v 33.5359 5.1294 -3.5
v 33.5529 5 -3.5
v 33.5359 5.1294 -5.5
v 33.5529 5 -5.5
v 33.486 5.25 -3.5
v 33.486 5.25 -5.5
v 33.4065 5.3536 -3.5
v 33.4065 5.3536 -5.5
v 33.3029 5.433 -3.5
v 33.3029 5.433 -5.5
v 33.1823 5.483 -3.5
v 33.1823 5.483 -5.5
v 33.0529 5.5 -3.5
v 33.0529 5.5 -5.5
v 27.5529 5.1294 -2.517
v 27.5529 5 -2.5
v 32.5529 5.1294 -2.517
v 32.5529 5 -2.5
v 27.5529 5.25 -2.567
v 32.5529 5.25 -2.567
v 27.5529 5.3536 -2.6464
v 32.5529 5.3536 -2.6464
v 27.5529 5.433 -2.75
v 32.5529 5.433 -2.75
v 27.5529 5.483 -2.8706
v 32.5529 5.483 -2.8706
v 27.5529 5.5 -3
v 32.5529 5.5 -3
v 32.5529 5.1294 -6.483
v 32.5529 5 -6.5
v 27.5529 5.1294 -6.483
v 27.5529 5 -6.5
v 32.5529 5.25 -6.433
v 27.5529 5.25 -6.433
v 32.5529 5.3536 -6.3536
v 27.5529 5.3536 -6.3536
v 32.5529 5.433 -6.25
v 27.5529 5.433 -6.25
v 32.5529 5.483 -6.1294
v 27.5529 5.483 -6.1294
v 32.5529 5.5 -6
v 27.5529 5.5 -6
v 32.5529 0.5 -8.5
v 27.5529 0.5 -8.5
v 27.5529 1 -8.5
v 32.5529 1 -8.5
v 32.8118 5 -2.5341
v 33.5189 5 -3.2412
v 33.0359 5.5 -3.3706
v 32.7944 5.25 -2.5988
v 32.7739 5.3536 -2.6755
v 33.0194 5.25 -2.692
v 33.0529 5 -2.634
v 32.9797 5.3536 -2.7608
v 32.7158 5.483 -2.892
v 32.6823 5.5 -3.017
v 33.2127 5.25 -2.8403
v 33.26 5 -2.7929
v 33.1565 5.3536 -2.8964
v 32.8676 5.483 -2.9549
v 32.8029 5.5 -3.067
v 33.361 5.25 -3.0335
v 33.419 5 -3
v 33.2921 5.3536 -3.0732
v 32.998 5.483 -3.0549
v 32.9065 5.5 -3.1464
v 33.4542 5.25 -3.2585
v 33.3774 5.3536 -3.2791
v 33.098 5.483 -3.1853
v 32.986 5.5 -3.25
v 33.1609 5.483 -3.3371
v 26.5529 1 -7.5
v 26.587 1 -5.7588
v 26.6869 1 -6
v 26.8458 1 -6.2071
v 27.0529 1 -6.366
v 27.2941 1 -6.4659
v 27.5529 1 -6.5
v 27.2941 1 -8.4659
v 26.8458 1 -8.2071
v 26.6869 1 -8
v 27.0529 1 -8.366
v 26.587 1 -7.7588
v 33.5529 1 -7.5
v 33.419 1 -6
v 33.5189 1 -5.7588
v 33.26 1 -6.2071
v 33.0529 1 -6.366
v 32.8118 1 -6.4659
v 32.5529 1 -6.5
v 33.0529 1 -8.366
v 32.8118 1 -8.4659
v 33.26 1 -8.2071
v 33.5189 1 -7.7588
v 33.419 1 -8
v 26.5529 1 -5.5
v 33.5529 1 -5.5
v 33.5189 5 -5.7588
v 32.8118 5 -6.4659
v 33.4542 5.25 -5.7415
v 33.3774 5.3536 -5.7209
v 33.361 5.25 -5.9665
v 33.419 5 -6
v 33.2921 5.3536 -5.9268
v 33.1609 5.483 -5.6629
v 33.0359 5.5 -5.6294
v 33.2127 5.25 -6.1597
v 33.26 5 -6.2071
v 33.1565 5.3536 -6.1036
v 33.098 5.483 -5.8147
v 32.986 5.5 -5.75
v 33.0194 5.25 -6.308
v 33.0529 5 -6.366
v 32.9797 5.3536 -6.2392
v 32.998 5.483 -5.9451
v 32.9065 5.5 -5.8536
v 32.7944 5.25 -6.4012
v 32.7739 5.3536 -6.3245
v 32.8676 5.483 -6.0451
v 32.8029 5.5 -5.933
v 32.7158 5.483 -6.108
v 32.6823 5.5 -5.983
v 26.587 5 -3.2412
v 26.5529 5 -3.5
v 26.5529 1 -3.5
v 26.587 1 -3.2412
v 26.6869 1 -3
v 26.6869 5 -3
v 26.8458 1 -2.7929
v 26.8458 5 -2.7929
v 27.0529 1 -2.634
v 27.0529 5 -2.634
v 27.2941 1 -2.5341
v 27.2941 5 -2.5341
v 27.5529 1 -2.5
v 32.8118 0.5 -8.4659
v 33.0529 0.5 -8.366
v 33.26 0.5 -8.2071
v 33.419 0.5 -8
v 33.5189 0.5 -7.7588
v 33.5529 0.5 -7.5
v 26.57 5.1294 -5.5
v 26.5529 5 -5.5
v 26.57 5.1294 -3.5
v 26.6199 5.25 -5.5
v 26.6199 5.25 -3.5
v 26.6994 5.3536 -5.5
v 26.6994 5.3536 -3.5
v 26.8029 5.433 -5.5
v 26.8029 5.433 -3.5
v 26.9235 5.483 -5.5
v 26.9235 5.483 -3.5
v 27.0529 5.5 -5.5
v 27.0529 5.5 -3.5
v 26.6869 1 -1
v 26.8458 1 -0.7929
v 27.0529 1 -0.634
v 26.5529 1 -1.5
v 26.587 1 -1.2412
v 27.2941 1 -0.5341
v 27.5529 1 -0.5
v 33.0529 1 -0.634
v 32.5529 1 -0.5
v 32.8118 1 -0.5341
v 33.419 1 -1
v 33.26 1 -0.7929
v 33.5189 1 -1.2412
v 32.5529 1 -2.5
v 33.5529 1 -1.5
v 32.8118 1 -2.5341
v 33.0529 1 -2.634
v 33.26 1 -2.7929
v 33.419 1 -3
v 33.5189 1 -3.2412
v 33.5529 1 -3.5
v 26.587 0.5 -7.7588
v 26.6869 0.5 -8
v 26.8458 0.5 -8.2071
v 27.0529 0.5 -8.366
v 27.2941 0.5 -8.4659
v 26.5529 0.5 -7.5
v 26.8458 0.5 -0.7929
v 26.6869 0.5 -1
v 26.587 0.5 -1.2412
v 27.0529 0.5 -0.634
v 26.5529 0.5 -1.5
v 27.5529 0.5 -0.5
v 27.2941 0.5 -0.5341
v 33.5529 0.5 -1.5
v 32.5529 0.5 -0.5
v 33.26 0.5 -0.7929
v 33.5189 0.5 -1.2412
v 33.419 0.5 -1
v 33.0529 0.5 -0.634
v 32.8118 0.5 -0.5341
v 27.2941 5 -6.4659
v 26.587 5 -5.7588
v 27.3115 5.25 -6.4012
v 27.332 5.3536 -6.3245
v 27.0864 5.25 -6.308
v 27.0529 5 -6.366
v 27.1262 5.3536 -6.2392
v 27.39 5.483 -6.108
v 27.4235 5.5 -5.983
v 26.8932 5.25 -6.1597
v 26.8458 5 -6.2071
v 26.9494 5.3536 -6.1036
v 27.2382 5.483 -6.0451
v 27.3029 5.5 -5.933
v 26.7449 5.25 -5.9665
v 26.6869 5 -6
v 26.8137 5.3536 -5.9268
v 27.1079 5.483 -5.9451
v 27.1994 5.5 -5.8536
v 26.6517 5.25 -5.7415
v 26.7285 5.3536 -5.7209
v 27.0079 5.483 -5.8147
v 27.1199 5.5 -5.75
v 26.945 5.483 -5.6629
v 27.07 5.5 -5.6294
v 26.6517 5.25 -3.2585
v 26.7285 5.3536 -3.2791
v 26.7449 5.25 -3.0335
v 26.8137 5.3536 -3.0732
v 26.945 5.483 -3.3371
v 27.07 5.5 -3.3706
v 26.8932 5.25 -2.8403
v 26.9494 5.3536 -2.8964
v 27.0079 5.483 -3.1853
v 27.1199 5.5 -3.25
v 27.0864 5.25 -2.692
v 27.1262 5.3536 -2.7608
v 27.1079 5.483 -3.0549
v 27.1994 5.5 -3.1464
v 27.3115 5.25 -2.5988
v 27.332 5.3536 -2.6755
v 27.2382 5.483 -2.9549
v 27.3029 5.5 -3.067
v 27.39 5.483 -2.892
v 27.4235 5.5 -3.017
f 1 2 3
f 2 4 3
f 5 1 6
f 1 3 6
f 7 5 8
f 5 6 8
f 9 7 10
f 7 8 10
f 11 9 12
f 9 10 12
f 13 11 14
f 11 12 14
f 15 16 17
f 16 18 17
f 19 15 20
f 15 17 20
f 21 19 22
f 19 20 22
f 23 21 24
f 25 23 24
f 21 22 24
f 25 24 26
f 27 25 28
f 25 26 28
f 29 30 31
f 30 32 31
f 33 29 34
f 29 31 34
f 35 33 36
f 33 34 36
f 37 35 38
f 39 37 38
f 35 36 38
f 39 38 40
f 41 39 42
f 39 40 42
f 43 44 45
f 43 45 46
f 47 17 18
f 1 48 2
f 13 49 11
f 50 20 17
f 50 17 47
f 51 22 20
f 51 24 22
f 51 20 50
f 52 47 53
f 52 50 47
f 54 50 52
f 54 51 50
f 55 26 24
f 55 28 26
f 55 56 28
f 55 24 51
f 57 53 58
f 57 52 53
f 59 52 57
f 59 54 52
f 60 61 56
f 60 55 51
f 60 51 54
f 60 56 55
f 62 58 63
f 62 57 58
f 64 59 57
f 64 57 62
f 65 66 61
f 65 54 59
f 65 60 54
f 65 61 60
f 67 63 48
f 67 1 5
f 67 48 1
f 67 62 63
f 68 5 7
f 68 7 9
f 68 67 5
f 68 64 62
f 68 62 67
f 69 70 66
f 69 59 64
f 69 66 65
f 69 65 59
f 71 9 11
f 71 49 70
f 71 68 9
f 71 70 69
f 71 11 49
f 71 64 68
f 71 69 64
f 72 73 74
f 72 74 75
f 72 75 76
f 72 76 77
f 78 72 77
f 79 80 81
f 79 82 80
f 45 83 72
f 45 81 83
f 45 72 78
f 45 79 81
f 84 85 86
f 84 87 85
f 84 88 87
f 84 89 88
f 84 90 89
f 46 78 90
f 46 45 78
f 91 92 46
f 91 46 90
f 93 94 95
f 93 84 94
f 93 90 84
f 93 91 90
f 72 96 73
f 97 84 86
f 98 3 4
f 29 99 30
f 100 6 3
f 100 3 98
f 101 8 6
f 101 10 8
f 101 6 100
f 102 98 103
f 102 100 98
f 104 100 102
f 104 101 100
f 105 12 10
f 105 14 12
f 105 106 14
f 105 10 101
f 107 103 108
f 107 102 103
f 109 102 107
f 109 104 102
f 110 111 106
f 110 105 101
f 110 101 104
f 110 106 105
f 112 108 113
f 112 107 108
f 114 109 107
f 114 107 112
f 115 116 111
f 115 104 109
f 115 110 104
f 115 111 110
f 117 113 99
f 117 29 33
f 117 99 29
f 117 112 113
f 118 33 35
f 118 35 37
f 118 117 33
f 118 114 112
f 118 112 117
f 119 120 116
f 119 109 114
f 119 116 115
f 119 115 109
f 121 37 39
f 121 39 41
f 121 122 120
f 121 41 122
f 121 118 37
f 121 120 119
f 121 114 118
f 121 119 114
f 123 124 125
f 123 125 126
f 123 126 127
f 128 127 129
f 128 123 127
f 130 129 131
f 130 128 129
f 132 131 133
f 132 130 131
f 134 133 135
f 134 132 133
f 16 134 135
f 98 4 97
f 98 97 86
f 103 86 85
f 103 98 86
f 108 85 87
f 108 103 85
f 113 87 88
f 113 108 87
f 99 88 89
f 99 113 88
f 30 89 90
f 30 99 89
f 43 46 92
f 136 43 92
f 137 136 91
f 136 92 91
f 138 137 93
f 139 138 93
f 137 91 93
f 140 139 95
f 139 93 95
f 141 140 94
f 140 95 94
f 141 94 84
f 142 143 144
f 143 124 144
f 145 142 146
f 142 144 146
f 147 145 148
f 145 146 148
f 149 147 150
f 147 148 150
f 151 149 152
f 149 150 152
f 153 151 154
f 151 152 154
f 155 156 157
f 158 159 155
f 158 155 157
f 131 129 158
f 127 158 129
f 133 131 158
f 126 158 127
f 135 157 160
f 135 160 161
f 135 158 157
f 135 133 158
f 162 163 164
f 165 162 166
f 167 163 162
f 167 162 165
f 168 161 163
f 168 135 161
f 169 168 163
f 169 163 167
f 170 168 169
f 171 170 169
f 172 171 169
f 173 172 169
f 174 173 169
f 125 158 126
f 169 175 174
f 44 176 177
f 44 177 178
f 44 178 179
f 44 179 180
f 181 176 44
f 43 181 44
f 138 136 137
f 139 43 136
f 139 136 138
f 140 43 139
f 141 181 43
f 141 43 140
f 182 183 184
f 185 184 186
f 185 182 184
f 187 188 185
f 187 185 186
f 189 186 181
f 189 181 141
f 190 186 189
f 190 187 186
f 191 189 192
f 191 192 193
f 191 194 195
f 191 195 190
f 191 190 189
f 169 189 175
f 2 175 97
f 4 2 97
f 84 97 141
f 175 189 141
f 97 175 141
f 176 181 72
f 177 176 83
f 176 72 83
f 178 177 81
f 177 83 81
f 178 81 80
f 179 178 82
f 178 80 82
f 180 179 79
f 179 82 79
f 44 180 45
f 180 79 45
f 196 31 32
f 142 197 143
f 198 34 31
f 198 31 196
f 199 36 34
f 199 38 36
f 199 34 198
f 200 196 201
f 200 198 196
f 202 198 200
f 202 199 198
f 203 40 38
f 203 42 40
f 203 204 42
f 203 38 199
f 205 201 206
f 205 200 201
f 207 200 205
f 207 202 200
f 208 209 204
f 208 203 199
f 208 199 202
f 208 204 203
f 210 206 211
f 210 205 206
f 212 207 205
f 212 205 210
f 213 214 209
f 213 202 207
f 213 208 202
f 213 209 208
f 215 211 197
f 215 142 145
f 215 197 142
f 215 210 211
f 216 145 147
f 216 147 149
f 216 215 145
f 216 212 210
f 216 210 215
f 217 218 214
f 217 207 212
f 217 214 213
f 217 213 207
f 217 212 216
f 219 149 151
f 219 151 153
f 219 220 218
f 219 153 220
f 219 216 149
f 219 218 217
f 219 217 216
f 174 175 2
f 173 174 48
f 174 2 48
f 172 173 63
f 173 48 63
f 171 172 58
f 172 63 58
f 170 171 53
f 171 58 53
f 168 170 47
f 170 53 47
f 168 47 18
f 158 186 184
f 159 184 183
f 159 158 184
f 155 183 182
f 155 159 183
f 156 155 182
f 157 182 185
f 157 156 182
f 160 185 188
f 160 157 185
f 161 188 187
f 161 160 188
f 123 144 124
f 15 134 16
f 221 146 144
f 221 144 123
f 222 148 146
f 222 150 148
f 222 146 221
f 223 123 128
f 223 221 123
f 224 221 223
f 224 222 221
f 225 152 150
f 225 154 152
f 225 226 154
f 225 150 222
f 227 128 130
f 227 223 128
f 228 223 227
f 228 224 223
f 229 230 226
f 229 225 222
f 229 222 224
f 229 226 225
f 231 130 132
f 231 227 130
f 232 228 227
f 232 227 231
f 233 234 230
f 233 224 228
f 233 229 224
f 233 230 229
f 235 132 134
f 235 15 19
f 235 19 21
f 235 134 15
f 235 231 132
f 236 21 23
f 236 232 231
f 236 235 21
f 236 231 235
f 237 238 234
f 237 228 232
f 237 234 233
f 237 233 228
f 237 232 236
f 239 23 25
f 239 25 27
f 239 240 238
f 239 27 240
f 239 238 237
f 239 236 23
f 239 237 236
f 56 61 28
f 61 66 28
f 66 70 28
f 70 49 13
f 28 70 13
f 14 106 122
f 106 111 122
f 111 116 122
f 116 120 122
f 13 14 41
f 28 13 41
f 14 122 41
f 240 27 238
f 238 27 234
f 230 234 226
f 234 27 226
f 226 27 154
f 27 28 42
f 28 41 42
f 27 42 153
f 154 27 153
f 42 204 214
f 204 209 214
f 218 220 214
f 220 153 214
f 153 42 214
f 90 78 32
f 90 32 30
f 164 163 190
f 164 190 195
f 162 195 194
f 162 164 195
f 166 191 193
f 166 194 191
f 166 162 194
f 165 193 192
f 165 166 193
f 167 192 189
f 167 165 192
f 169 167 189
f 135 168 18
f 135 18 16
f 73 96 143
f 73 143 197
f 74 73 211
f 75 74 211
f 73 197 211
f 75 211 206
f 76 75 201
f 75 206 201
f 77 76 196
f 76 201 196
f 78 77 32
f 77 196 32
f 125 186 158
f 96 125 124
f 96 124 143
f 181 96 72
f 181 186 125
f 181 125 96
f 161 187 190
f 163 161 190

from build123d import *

# Parameters (mm, degrees)
SKETCH_1_W          = 7
SKETCH_1_H          = 8
EXTRUDE_1_DEPTH     = 1
EXTRUDE_2_DEPTH     = 4.5
FILLET_1_R          = 1
FILLET_2_R          = 0.5
CUT_EXTRUDE_START   = -0.5
CUT_EXTRUDE_1_DEPTH = 0.5


with BuildPart() as part:
    # 草图1 → 凸台-拉伸1 (new body)
    with BuildSketch(Plane(origin=(0, 0, 0), x_dir=(1, 0, 0), z_dir=(0, 1, 0))):
        with Locations((30.052937772, 4.5)):
            Rectangle(SKETCH_1_W, SKETCH_1_H)
    extrude(amount=EXTRUDE_1_DEPTH)

    # 草图2 → 凸台-拉伸2 (add)
    with BuildSketch(Plane(origin=(0, 1, 0), x_dir=(1, 0, 0), z_dir=(0, 1, 0))):
        Polygon((26.552937772, 4.5), (26.552937772, 6.5), (33.552937772, 6.5), (33.552937772, 2.5), (26.552937772, 2.5), align=None)
    extrude(amount=EXTRUDE_2_DEPTH)

    # 圆角1
    fillet_1_edges = [part.edges().sort_by_distance(p)[0] for p in [
        (26.552937772, 3.25, -2.5),
        (33.552937772, 3.25, -2.5),
        (33.552937772, 3.25, -6.5),
        (26.552937772, 3.25, -6.5),
        (26.552937772, 0.5, -8.5),
        (33.552937772, 0.5, -8.5),
        (33.552937772, 0.5, -0.5),
        (26.552937772, 0.5, -0.5),
    ]]
    fillet(fillet_1_edges, radius=FILLET_1_R)

    # 圆角2
    fillet_2_edges = [part.edges().sort_by_distance(p)[0] for p in [
        (26.552937772, 5.5, -4.5),
        (30.052937772, 5.5, -6.5),
        (30.052937772, 5.5, -2.5),
        (33.552937772, 5.5, -4.5),
        (33.260044553, 5.5, -6.207106781),
        (33.260044553, 5.5, -2.792893219),
        (26.84583099, 5.5, -2.792893219),
        (26.84583099, 5.5, -6.207106781),
    ]]
    fillet(fillet_2_edges, radius=FILLET_2_R)

    # 草图3 → 切除-拉伸1 (cut)
    with BuildSketch(Plane.XZ.offset(CUT_EXTRUDE_START)):
        with BuildLine():
            Line((26.552937772, -1.5), (26.552937772, -7.5))
            ThreePointArc((26.552937772, -7.5), (26.84583099, -8.207106781), (27.552937772, -8.5))
            Line((27.552937772, -8.5), (32.552937772, -8.5))
            ThreePointArc((32.552937772, -8.5), (33.260044553, -8.207106781), (33.552937772, -7.5))
            Line((33.552937772, -7.5), (33.552937772, -1.5))
            ThreePointArc((33.552937772, -1.5), (33.260044553, -0.792893219), (32.552937772, -0.5))
            Line((32.552937772, -0.5), (27.552937772, -0.5))
            ThreePointArc((27.552937772, -0.5), (26.84583099, -0.792893219), (26.552937772, -1.5))
        make_face()
    extrude(amount=CUT_EXTRUDE_1_DEPTH, mode=Mode.SUBTRACT)


solid = part.part
